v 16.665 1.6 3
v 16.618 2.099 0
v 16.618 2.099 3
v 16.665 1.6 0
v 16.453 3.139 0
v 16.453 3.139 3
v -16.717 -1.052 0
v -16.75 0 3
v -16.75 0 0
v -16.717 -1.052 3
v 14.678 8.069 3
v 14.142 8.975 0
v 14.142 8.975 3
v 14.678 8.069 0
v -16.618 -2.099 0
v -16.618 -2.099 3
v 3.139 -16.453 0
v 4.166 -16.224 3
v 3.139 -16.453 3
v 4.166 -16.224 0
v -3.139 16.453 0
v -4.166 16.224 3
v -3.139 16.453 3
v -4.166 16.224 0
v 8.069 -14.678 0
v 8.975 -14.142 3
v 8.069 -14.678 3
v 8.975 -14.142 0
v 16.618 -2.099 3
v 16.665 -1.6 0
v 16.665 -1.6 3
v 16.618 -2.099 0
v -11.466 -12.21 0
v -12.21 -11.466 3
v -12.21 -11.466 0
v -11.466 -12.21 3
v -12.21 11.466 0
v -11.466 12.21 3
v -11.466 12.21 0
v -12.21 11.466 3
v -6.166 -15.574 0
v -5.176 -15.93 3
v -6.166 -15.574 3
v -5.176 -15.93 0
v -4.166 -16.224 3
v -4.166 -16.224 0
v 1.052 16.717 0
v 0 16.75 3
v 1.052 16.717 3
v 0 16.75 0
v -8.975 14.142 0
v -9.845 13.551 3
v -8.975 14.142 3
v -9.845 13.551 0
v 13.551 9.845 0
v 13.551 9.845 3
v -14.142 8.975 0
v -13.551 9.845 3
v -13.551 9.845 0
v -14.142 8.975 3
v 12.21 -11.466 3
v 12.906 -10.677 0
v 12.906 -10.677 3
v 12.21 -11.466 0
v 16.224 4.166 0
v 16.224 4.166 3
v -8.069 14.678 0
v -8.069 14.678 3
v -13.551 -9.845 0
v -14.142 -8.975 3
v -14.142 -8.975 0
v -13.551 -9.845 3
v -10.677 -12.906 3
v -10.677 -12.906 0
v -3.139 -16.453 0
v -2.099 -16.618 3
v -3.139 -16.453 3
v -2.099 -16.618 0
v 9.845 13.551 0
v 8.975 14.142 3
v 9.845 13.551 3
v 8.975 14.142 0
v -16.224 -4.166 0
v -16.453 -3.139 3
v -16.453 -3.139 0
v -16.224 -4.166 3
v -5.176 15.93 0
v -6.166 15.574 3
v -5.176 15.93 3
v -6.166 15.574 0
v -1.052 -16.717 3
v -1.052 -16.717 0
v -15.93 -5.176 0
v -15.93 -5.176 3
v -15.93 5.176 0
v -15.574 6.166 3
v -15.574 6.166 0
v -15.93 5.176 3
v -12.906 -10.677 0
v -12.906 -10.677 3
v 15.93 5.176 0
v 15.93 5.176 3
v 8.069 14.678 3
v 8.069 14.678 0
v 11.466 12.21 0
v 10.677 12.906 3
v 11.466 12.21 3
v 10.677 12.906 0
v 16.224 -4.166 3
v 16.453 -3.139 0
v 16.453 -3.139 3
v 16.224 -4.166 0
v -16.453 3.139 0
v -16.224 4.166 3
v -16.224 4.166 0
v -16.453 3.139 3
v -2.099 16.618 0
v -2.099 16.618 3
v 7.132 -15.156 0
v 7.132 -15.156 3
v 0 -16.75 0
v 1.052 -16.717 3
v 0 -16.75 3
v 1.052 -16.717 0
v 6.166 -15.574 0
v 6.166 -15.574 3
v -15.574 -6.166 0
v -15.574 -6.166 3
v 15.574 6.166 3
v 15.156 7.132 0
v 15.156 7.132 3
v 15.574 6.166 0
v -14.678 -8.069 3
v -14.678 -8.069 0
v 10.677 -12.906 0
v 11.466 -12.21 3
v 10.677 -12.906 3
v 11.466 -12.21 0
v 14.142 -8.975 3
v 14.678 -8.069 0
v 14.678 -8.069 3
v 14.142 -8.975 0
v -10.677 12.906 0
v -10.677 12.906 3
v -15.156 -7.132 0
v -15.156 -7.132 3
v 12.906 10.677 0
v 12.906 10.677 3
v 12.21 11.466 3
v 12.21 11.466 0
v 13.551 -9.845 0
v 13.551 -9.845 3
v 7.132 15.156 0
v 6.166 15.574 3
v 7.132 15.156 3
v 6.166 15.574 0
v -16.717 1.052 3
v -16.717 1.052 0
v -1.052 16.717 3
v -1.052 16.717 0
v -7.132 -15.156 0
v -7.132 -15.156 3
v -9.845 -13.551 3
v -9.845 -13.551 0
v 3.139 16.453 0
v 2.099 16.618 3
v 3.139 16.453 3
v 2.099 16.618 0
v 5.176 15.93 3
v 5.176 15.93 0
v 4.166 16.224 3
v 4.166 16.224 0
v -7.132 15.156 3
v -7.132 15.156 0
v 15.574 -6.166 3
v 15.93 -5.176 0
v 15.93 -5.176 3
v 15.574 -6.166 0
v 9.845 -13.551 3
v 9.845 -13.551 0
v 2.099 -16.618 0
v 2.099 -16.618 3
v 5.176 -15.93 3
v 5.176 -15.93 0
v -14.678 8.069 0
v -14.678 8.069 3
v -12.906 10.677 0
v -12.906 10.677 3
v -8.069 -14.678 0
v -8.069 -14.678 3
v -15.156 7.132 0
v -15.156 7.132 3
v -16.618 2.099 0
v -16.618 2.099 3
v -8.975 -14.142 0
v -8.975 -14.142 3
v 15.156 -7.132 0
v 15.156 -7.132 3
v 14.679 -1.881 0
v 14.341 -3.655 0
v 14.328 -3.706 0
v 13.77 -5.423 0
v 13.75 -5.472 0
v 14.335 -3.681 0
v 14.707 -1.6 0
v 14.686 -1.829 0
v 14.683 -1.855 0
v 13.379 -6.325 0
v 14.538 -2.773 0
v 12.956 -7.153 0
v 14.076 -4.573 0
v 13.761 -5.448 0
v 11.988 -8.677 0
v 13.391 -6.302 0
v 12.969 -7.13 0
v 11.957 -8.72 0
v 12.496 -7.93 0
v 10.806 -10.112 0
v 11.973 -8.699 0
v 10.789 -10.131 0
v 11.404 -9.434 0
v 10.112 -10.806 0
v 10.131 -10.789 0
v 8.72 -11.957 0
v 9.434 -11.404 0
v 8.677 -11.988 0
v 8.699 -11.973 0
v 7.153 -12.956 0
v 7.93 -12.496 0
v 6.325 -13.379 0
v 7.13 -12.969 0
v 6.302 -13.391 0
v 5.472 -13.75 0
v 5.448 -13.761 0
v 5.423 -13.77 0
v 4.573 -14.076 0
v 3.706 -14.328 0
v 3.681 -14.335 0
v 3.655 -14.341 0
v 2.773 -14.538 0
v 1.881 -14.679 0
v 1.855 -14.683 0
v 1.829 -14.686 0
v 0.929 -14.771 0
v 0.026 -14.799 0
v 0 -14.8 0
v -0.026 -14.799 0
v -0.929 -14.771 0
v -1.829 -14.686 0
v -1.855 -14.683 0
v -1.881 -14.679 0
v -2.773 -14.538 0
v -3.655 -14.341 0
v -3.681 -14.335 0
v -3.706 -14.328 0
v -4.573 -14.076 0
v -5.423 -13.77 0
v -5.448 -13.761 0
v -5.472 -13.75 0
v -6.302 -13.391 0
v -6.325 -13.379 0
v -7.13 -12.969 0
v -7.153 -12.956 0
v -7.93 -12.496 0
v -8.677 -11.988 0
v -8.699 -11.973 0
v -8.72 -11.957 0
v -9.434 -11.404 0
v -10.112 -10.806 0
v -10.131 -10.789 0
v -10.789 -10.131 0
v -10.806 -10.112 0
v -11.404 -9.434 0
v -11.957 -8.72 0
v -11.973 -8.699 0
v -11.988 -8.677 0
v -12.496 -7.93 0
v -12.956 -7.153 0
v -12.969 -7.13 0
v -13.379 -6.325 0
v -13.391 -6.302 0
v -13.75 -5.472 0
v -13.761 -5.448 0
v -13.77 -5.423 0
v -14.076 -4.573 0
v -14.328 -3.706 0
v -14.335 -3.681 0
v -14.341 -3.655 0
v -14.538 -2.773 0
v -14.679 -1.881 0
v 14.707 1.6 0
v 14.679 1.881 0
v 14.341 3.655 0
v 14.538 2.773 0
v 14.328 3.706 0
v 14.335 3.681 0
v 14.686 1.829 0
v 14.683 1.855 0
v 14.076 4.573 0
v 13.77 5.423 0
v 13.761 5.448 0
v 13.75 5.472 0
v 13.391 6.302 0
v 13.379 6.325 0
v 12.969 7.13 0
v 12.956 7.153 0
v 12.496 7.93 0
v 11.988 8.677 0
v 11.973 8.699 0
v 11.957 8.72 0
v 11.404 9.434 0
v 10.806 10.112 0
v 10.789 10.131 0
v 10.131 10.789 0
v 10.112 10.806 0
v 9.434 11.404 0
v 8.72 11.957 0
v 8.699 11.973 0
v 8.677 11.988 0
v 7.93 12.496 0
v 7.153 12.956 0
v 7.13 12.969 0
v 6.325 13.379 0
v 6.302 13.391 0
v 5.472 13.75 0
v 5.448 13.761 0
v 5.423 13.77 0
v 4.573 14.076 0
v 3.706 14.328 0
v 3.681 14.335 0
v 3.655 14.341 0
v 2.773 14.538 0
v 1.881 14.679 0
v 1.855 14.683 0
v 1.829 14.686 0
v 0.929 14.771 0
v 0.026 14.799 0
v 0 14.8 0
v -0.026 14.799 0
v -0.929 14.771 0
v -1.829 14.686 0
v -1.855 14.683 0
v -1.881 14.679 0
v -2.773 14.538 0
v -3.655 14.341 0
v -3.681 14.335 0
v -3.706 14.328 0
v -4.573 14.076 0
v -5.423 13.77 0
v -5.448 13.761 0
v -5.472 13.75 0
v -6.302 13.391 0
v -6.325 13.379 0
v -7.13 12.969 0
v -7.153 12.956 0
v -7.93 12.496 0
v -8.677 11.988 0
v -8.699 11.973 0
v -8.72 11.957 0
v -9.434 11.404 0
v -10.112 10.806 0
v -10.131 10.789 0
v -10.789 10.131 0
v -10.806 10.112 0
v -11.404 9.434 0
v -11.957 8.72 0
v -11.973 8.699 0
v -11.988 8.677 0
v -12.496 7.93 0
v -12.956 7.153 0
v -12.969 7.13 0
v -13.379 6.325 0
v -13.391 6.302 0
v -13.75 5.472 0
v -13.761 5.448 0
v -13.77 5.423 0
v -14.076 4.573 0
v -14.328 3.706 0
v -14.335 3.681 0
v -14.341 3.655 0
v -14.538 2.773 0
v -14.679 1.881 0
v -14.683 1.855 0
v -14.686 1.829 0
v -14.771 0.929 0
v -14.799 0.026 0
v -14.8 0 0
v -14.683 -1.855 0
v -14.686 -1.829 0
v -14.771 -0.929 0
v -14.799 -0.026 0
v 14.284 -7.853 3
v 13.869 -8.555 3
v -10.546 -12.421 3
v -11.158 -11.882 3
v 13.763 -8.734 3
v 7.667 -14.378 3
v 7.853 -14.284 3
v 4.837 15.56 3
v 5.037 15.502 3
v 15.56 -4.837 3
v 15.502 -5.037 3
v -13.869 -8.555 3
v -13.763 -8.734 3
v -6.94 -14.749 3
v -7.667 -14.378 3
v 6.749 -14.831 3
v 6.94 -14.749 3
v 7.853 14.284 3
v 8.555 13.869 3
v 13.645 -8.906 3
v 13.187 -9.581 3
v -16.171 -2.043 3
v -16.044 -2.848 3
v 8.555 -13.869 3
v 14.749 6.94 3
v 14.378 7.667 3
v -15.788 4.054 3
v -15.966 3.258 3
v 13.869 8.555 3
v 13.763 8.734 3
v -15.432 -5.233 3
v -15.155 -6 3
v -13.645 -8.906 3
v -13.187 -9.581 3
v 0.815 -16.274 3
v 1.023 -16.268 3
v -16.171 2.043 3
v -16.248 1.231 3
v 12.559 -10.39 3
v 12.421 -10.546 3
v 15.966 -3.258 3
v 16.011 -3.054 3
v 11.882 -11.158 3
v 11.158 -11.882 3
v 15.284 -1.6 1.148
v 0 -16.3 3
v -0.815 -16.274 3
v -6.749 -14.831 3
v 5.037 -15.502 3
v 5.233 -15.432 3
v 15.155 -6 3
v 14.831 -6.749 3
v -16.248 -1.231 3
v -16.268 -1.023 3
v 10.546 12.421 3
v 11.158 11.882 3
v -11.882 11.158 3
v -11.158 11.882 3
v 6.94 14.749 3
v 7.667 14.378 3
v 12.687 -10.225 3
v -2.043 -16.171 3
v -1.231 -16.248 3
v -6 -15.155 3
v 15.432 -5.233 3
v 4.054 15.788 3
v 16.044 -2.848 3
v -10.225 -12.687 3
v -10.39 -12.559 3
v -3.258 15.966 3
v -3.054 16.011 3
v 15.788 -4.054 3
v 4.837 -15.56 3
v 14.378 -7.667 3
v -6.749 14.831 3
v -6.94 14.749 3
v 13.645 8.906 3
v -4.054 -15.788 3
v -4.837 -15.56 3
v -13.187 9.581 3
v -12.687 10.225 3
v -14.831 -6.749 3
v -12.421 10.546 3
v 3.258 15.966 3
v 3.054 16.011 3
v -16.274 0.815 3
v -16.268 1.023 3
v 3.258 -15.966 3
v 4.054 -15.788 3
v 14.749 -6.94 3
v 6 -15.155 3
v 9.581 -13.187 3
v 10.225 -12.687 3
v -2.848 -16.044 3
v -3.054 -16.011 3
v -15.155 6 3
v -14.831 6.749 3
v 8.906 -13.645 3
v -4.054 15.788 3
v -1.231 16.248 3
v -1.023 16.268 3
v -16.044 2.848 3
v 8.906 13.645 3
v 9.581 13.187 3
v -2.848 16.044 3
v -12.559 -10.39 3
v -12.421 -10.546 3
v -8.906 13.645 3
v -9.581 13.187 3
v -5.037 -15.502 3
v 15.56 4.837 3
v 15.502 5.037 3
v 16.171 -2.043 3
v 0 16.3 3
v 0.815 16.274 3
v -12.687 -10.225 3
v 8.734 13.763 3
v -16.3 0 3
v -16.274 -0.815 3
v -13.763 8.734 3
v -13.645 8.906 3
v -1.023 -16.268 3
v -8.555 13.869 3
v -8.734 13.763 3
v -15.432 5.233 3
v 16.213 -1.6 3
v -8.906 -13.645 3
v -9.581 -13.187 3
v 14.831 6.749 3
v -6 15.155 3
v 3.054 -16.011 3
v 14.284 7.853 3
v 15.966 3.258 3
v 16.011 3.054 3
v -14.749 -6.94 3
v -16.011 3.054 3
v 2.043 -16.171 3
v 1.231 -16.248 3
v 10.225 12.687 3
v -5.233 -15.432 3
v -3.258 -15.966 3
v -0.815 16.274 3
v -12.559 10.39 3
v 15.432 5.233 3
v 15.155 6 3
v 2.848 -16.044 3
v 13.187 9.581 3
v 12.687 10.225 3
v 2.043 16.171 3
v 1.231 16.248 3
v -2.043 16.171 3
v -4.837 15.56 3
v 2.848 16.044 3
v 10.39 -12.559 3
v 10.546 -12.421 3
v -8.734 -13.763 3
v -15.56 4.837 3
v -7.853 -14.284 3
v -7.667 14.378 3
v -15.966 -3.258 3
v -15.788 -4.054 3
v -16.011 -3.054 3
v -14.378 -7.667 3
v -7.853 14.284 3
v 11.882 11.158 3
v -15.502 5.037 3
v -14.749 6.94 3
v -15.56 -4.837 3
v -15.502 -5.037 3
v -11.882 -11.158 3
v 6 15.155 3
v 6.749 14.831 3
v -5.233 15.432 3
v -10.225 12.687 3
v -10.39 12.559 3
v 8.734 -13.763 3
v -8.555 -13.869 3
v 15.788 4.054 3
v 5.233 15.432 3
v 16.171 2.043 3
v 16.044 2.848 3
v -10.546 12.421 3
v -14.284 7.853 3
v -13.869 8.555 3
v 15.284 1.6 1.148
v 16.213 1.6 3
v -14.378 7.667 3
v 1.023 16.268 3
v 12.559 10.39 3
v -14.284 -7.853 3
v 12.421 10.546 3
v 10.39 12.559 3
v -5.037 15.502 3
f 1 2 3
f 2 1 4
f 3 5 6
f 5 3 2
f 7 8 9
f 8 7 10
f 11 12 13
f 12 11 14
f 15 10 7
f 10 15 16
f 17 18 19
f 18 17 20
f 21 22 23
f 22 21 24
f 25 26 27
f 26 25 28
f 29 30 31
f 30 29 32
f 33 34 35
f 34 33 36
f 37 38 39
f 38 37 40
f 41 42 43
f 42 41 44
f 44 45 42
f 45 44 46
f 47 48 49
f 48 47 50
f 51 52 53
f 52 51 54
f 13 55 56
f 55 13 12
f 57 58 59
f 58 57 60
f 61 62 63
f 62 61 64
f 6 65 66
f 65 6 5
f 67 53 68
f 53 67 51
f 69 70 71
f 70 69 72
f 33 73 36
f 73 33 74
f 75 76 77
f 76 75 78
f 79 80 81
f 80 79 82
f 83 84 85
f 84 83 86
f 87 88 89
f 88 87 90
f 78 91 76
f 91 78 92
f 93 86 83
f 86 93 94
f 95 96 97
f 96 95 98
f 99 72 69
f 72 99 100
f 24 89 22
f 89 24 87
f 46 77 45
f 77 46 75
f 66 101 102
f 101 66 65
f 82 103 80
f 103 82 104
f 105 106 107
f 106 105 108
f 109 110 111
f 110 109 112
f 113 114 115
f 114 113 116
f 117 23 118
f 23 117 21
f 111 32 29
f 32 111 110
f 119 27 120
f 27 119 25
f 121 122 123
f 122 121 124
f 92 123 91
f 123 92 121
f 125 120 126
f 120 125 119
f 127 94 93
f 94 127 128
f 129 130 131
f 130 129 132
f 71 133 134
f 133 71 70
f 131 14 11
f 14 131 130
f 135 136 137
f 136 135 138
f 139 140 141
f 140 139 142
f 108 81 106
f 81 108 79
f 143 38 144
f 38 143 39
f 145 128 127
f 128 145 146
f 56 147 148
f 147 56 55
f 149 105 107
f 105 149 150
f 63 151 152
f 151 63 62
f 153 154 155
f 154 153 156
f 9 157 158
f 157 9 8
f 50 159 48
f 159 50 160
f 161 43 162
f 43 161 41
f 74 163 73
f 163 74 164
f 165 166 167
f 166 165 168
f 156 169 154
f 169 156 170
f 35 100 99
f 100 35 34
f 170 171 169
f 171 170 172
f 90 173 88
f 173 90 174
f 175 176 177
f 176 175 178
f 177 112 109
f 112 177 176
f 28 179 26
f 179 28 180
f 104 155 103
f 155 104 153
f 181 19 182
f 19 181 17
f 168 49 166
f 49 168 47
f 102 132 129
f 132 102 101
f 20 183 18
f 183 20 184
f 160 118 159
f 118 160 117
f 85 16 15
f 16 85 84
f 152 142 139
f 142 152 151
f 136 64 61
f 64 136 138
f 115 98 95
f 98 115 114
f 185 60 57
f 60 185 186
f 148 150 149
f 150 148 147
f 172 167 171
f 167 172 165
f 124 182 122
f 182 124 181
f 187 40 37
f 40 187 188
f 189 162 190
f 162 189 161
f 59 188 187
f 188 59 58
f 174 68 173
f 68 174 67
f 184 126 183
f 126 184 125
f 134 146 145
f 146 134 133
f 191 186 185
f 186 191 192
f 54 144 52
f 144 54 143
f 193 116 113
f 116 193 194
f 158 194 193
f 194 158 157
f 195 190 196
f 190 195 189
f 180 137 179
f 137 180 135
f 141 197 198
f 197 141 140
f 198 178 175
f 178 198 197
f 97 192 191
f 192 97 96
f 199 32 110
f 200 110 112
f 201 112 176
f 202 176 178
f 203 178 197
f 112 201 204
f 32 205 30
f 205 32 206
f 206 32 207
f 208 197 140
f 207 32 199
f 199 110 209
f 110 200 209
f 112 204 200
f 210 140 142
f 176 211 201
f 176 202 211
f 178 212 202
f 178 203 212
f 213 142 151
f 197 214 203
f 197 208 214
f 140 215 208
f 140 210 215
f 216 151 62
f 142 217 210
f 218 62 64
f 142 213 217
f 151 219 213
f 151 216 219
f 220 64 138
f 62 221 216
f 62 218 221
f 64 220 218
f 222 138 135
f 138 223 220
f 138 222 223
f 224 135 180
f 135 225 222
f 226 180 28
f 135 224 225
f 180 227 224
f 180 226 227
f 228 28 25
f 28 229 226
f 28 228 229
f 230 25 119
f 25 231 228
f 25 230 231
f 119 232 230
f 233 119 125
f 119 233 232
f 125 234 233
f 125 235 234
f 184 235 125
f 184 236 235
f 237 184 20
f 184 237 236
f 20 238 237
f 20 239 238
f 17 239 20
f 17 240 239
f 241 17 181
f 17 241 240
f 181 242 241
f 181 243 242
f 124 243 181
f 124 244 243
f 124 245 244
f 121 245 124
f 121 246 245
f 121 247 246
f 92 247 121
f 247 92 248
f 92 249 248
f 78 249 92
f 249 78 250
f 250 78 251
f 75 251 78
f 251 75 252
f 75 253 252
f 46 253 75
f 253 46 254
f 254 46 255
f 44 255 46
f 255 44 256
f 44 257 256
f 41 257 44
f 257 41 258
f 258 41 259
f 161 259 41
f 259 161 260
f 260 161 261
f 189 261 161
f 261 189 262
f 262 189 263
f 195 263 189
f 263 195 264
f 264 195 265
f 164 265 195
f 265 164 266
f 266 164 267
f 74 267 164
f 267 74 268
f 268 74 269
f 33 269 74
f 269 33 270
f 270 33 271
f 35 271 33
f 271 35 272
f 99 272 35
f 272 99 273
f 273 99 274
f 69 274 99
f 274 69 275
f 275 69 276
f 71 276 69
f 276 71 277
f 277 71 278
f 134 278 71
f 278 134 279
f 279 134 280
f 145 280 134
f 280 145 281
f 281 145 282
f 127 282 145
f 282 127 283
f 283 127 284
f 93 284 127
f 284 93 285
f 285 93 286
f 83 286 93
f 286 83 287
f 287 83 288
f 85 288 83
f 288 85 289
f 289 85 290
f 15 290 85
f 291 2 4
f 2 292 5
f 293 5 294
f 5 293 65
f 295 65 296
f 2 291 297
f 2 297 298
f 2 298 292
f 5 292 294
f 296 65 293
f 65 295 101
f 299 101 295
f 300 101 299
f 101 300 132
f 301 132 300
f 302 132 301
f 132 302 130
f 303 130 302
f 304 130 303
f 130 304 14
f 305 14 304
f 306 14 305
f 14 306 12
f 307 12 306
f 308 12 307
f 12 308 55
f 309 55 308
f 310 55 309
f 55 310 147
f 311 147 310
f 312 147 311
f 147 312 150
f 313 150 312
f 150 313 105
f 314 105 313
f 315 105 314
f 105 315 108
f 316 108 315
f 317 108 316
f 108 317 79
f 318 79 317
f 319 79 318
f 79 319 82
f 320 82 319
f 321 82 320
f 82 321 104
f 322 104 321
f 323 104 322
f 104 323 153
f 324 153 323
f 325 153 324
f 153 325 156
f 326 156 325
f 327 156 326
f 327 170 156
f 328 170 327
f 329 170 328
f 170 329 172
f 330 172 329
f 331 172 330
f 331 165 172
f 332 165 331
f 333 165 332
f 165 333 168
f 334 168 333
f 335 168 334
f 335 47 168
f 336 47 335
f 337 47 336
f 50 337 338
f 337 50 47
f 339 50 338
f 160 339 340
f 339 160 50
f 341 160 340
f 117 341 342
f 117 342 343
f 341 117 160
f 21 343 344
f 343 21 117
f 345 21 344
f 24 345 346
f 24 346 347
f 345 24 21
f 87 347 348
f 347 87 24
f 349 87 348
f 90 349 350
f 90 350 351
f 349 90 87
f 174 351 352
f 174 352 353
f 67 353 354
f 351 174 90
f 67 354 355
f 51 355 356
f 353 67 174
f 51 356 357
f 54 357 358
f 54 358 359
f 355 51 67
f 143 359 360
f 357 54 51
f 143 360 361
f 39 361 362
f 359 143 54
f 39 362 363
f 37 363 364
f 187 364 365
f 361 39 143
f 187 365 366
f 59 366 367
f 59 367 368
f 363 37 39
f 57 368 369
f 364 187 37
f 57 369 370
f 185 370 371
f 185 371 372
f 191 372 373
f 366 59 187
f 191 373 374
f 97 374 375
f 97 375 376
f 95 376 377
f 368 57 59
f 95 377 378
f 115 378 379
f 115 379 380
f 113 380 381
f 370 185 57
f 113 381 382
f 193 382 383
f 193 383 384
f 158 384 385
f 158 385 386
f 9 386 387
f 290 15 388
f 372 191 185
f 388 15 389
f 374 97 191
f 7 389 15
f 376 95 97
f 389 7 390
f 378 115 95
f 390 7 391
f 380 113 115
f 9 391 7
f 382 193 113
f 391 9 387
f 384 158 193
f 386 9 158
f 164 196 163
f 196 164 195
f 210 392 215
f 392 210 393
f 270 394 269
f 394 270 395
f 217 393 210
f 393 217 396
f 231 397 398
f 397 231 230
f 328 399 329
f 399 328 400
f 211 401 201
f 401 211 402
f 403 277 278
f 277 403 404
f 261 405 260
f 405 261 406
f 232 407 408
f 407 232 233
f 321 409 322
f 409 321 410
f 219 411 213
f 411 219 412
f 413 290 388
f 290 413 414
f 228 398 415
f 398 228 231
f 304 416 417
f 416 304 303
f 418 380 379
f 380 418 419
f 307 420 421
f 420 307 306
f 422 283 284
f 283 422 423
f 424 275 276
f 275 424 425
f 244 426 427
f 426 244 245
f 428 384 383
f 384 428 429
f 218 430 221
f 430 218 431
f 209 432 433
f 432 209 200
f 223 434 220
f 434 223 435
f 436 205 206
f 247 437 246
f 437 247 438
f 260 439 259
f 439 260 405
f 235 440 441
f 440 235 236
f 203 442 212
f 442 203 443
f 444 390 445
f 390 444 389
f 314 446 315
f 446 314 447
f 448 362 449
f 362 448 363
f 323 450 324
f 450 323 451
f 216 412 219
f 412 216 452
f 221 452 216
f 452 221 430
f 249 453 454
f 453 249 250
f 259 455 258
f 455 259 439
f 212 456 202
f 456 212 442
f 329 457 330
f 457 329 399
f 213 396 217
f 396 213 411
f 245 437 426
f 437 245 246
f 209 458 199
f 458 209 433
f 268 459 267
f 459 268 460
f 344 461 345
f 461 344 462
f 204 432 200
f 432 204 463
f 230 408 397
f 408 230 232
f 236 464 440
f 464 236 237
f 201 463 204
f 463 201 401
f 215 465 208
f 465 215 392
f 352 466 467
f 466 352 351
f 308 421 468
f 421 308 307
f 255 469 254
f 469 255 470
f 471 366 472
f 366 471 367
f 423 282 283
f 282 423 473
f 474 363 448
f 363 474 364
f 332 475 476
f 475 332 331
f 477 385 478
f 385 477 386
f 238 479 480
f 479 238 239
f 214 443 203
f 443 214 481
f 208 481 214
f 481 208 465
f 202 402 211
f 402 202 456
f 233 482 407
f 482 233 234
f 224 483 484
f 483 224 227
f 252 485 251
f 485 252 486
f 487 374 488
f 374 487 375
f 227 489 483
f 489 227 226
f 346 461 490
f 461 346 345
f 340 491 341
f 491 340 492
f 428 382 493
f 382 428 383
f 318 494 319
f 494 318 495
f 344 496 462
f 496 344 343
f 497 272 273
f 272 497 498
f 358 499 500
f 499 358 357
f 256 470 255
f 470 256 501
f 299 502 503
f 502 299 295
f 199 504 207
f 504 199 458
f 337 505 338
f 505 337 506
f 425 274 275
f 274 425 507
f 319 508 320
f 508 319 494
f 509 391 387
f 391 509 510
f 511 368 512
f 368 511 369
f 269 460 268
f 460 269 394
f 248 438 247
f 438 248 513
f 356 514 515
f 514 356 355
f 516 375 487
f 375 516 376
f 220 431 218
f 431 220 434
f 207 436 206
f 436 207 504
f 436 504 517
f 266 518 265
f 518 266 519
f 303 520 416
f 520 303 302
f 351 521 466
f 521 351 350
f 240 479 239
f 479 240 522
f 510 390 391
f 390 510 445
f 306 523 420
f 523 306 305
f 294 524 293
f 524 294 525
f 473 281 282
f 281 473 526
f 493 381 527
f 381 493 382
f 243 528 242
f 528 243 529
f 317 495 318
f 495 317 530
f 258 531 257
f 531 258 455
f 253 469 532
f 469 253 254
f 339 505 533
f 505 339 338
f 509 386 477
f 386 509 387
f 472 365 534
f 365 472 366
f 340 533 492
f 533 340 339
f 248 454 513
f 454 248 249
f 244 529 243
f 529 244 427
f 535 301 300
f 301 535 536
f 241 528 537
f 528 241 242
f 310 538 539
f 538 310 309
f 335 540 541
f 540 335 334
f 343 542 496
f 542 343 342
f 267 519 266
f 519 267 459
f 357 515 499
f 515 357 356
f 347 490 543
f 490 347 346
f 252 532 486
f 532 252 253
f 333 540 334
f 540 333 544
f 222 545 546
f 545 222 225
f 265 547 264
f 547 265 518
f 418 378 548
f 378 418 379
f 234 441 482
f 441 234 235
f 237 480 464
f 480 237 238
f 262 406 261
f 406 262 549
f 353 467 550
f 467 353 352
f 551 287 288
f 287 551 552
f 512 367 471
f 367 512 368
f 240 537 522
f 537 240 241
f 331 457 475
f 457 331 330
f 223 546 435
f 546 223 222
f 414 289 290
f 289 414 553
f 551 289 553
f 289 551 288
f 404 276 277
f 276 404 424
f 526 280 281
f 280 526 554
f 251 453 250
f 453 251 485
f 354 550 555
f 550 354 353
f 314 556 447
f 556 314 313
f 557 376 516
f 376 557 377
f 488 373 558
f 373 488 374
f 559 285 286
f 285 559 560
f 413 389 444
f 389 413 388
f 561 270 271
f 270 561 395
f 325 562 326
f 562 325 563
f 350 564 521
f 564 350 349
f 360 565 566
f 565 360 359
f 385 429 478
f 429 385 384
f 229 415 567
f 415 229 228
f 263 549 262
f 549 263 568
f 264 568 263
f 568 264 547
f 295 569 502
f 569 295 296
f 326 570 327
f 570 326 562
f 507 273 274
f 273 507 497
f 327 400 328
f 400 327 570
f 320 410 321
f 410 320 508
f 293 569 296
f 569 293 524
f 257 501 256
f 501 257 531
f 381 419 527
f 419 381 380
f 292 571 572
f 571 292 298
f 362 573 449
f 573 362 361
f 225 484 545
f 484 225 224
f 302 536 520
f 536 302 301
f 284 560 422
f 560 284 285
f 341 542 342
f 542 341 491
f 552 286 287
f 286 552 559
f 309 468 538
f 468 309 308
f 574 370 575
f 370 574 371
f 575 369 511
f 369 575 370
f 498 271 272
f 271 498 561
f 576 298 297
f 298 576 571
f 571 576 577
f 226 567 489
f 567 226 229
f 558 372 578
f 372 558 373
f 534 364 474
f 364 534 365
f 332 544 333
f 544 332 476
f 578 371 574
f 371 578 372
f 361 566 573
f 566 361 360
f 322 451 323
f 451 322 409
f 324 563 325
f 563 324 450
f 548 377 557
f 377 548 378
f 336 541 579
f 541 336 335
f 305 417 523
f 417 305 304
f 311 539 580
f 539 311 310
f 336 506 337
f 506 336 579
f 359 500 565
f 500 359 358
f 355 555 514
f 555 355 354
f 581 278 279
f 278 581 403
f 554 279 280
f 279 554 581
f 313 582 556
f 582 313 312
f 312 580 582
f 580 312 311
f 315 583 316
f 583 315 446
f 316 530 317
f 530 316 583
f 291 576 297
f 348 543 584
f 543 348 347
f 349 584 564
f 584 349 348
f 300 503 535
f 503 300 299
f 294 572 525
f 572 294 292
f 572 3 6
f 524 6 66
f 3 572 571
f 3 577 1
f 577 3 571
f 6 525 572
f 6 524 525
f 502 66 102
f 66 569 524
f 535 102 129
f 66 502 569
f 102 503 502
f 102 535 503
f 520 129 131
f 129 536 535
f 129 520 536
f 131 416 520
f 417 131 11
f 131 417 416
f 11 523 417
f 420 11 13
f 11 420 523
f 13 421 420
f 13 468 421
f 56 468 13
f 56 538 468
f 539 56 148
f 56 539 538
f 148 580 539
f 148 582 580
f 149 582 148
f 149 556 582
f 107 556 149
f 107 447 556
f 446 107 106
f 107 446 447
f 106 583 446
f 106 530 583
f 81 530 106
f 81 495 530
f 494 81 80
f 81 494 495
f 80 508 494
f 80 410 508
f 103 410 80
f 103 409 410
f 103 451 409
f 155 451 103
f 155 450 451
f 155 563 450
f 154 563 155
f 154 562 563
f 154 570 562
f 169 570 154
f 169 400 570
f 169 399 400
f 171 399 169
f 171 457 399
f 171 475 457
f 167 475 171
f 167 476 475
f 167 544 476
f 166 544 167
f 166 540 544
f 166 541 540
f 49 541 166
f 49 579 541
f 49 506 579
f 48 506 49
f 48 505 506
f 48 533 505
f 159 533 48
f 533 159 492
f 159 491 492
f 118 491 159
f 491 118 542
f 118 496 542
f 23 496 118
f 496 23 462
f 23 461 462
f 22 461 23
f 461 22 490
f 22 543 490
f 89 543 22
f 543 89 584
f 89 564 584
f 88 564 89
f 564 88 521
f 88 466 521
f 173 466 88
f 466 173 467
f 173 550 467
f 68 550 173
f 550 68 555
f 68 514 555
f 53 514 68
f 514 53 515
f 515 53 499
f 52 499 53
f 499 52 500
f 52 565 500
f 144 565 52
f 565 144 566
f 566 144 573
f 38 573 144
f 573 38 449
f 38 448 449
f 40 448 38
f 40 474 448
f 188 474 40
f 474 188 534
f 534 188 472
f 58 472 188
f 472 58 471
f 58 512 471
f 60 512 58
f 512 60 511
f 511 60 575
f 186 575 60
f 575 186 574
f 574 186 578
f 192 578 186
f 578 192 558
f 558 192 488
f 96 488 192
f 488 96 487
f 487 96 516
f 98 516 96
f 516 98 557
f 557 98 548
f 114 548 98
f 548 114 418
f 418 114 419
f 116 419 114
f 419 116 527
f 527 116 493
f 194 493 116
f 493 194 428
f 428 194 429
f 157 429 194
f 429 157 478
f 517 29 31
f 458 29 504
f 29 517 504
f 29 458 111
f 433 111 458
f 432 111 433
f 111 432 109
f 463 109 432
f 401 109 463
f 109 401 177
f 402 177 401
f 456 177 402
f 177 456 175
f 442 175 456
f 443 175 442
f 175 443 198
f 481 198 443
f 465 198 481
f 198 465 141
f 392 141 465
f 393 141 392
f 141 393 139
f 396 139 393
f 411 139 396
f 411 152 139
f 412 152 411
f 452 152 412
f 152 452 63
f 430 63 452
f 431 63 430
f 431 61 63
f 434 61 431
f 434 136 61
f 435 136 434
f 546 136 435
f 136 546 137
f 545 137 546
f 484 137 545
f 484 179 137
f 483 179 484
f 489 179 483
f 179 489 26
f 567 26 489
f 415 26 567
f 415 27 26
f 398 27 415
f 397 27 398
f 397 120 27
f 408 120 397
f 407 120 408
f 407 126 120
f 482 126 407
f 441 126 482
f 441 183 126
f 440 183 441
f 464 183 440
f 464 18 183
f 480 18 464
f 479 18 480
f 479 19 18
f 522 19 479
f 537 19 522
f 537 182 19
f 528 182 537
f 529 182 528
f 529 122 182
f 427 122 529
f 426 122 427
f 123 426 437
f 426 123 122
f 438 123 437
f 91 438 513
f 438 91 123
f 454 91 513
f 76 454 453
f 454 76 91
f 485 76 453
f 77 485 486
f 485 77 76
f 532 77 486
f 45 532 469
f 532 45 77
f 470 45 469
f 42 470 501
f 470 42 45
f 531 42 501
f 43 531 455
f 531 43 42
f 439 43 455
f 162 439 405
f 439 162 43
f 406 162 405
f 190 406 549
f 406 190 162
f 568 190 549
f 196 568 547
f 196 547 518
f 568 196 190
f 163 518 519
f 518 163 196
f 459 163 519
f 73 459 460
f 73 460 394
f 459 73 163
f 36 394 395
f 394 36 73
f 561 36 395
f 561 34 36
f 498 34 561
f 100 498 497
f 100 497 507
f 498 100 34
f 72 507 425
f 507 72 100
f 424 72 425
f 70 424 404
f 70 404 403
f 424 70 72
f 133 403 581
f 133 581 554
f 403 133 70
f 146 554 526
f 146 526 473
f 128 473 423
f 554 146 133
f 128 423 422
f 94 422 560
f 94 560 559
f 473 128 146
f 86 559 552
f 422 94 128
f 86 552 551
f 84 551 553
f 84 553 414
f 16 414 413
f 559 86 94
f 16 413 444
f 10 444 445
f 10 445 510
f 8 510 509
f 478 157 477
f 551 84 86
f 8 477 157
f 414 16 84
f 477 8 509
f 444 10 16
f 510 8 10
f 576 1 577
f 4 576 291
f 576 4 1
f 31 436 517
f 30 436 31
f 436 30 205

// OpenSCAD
// Insert a bit of extra space to get a better fit. May vary based on printer.
extra_spacing = 1.5;

// The diameter of the base at the bottom
base_diameter_lower = 32;

// The diameter of the base at the top
base_diameter_upper = 28;

// The height of the base
base_diameter_height = 4;

// The width of the slot, this allows the marker to flex a bit making it easier to put on. (Set to 0 for no slot)
slot_width = 3.2;

/* [Hidden] */
$fn = 100;

difference() {
    
    cylinder(d=base_diameter_lower+extra_spacing,h=base_diameter_height);
    translate([0,0,-0.1])
        cylinder(d2=base_diameter_lower+extra_spacing,d1=base_diameter_upper+extra_spacing,h=base_diameter_height);
    
    translate([0,0,base_diameter_height*3/4]) {
        cylinder(d=base_diameter_lower+extra_spacing+1,h=base_diameter_height);
    }
    
    if (slot_width > 0) {
        translate([0,-slot_width/2,-0.1]) {
            cube([base_diameter_lower,slot_width,base_diameter_height*2]);
        }
    }
    
    
}
